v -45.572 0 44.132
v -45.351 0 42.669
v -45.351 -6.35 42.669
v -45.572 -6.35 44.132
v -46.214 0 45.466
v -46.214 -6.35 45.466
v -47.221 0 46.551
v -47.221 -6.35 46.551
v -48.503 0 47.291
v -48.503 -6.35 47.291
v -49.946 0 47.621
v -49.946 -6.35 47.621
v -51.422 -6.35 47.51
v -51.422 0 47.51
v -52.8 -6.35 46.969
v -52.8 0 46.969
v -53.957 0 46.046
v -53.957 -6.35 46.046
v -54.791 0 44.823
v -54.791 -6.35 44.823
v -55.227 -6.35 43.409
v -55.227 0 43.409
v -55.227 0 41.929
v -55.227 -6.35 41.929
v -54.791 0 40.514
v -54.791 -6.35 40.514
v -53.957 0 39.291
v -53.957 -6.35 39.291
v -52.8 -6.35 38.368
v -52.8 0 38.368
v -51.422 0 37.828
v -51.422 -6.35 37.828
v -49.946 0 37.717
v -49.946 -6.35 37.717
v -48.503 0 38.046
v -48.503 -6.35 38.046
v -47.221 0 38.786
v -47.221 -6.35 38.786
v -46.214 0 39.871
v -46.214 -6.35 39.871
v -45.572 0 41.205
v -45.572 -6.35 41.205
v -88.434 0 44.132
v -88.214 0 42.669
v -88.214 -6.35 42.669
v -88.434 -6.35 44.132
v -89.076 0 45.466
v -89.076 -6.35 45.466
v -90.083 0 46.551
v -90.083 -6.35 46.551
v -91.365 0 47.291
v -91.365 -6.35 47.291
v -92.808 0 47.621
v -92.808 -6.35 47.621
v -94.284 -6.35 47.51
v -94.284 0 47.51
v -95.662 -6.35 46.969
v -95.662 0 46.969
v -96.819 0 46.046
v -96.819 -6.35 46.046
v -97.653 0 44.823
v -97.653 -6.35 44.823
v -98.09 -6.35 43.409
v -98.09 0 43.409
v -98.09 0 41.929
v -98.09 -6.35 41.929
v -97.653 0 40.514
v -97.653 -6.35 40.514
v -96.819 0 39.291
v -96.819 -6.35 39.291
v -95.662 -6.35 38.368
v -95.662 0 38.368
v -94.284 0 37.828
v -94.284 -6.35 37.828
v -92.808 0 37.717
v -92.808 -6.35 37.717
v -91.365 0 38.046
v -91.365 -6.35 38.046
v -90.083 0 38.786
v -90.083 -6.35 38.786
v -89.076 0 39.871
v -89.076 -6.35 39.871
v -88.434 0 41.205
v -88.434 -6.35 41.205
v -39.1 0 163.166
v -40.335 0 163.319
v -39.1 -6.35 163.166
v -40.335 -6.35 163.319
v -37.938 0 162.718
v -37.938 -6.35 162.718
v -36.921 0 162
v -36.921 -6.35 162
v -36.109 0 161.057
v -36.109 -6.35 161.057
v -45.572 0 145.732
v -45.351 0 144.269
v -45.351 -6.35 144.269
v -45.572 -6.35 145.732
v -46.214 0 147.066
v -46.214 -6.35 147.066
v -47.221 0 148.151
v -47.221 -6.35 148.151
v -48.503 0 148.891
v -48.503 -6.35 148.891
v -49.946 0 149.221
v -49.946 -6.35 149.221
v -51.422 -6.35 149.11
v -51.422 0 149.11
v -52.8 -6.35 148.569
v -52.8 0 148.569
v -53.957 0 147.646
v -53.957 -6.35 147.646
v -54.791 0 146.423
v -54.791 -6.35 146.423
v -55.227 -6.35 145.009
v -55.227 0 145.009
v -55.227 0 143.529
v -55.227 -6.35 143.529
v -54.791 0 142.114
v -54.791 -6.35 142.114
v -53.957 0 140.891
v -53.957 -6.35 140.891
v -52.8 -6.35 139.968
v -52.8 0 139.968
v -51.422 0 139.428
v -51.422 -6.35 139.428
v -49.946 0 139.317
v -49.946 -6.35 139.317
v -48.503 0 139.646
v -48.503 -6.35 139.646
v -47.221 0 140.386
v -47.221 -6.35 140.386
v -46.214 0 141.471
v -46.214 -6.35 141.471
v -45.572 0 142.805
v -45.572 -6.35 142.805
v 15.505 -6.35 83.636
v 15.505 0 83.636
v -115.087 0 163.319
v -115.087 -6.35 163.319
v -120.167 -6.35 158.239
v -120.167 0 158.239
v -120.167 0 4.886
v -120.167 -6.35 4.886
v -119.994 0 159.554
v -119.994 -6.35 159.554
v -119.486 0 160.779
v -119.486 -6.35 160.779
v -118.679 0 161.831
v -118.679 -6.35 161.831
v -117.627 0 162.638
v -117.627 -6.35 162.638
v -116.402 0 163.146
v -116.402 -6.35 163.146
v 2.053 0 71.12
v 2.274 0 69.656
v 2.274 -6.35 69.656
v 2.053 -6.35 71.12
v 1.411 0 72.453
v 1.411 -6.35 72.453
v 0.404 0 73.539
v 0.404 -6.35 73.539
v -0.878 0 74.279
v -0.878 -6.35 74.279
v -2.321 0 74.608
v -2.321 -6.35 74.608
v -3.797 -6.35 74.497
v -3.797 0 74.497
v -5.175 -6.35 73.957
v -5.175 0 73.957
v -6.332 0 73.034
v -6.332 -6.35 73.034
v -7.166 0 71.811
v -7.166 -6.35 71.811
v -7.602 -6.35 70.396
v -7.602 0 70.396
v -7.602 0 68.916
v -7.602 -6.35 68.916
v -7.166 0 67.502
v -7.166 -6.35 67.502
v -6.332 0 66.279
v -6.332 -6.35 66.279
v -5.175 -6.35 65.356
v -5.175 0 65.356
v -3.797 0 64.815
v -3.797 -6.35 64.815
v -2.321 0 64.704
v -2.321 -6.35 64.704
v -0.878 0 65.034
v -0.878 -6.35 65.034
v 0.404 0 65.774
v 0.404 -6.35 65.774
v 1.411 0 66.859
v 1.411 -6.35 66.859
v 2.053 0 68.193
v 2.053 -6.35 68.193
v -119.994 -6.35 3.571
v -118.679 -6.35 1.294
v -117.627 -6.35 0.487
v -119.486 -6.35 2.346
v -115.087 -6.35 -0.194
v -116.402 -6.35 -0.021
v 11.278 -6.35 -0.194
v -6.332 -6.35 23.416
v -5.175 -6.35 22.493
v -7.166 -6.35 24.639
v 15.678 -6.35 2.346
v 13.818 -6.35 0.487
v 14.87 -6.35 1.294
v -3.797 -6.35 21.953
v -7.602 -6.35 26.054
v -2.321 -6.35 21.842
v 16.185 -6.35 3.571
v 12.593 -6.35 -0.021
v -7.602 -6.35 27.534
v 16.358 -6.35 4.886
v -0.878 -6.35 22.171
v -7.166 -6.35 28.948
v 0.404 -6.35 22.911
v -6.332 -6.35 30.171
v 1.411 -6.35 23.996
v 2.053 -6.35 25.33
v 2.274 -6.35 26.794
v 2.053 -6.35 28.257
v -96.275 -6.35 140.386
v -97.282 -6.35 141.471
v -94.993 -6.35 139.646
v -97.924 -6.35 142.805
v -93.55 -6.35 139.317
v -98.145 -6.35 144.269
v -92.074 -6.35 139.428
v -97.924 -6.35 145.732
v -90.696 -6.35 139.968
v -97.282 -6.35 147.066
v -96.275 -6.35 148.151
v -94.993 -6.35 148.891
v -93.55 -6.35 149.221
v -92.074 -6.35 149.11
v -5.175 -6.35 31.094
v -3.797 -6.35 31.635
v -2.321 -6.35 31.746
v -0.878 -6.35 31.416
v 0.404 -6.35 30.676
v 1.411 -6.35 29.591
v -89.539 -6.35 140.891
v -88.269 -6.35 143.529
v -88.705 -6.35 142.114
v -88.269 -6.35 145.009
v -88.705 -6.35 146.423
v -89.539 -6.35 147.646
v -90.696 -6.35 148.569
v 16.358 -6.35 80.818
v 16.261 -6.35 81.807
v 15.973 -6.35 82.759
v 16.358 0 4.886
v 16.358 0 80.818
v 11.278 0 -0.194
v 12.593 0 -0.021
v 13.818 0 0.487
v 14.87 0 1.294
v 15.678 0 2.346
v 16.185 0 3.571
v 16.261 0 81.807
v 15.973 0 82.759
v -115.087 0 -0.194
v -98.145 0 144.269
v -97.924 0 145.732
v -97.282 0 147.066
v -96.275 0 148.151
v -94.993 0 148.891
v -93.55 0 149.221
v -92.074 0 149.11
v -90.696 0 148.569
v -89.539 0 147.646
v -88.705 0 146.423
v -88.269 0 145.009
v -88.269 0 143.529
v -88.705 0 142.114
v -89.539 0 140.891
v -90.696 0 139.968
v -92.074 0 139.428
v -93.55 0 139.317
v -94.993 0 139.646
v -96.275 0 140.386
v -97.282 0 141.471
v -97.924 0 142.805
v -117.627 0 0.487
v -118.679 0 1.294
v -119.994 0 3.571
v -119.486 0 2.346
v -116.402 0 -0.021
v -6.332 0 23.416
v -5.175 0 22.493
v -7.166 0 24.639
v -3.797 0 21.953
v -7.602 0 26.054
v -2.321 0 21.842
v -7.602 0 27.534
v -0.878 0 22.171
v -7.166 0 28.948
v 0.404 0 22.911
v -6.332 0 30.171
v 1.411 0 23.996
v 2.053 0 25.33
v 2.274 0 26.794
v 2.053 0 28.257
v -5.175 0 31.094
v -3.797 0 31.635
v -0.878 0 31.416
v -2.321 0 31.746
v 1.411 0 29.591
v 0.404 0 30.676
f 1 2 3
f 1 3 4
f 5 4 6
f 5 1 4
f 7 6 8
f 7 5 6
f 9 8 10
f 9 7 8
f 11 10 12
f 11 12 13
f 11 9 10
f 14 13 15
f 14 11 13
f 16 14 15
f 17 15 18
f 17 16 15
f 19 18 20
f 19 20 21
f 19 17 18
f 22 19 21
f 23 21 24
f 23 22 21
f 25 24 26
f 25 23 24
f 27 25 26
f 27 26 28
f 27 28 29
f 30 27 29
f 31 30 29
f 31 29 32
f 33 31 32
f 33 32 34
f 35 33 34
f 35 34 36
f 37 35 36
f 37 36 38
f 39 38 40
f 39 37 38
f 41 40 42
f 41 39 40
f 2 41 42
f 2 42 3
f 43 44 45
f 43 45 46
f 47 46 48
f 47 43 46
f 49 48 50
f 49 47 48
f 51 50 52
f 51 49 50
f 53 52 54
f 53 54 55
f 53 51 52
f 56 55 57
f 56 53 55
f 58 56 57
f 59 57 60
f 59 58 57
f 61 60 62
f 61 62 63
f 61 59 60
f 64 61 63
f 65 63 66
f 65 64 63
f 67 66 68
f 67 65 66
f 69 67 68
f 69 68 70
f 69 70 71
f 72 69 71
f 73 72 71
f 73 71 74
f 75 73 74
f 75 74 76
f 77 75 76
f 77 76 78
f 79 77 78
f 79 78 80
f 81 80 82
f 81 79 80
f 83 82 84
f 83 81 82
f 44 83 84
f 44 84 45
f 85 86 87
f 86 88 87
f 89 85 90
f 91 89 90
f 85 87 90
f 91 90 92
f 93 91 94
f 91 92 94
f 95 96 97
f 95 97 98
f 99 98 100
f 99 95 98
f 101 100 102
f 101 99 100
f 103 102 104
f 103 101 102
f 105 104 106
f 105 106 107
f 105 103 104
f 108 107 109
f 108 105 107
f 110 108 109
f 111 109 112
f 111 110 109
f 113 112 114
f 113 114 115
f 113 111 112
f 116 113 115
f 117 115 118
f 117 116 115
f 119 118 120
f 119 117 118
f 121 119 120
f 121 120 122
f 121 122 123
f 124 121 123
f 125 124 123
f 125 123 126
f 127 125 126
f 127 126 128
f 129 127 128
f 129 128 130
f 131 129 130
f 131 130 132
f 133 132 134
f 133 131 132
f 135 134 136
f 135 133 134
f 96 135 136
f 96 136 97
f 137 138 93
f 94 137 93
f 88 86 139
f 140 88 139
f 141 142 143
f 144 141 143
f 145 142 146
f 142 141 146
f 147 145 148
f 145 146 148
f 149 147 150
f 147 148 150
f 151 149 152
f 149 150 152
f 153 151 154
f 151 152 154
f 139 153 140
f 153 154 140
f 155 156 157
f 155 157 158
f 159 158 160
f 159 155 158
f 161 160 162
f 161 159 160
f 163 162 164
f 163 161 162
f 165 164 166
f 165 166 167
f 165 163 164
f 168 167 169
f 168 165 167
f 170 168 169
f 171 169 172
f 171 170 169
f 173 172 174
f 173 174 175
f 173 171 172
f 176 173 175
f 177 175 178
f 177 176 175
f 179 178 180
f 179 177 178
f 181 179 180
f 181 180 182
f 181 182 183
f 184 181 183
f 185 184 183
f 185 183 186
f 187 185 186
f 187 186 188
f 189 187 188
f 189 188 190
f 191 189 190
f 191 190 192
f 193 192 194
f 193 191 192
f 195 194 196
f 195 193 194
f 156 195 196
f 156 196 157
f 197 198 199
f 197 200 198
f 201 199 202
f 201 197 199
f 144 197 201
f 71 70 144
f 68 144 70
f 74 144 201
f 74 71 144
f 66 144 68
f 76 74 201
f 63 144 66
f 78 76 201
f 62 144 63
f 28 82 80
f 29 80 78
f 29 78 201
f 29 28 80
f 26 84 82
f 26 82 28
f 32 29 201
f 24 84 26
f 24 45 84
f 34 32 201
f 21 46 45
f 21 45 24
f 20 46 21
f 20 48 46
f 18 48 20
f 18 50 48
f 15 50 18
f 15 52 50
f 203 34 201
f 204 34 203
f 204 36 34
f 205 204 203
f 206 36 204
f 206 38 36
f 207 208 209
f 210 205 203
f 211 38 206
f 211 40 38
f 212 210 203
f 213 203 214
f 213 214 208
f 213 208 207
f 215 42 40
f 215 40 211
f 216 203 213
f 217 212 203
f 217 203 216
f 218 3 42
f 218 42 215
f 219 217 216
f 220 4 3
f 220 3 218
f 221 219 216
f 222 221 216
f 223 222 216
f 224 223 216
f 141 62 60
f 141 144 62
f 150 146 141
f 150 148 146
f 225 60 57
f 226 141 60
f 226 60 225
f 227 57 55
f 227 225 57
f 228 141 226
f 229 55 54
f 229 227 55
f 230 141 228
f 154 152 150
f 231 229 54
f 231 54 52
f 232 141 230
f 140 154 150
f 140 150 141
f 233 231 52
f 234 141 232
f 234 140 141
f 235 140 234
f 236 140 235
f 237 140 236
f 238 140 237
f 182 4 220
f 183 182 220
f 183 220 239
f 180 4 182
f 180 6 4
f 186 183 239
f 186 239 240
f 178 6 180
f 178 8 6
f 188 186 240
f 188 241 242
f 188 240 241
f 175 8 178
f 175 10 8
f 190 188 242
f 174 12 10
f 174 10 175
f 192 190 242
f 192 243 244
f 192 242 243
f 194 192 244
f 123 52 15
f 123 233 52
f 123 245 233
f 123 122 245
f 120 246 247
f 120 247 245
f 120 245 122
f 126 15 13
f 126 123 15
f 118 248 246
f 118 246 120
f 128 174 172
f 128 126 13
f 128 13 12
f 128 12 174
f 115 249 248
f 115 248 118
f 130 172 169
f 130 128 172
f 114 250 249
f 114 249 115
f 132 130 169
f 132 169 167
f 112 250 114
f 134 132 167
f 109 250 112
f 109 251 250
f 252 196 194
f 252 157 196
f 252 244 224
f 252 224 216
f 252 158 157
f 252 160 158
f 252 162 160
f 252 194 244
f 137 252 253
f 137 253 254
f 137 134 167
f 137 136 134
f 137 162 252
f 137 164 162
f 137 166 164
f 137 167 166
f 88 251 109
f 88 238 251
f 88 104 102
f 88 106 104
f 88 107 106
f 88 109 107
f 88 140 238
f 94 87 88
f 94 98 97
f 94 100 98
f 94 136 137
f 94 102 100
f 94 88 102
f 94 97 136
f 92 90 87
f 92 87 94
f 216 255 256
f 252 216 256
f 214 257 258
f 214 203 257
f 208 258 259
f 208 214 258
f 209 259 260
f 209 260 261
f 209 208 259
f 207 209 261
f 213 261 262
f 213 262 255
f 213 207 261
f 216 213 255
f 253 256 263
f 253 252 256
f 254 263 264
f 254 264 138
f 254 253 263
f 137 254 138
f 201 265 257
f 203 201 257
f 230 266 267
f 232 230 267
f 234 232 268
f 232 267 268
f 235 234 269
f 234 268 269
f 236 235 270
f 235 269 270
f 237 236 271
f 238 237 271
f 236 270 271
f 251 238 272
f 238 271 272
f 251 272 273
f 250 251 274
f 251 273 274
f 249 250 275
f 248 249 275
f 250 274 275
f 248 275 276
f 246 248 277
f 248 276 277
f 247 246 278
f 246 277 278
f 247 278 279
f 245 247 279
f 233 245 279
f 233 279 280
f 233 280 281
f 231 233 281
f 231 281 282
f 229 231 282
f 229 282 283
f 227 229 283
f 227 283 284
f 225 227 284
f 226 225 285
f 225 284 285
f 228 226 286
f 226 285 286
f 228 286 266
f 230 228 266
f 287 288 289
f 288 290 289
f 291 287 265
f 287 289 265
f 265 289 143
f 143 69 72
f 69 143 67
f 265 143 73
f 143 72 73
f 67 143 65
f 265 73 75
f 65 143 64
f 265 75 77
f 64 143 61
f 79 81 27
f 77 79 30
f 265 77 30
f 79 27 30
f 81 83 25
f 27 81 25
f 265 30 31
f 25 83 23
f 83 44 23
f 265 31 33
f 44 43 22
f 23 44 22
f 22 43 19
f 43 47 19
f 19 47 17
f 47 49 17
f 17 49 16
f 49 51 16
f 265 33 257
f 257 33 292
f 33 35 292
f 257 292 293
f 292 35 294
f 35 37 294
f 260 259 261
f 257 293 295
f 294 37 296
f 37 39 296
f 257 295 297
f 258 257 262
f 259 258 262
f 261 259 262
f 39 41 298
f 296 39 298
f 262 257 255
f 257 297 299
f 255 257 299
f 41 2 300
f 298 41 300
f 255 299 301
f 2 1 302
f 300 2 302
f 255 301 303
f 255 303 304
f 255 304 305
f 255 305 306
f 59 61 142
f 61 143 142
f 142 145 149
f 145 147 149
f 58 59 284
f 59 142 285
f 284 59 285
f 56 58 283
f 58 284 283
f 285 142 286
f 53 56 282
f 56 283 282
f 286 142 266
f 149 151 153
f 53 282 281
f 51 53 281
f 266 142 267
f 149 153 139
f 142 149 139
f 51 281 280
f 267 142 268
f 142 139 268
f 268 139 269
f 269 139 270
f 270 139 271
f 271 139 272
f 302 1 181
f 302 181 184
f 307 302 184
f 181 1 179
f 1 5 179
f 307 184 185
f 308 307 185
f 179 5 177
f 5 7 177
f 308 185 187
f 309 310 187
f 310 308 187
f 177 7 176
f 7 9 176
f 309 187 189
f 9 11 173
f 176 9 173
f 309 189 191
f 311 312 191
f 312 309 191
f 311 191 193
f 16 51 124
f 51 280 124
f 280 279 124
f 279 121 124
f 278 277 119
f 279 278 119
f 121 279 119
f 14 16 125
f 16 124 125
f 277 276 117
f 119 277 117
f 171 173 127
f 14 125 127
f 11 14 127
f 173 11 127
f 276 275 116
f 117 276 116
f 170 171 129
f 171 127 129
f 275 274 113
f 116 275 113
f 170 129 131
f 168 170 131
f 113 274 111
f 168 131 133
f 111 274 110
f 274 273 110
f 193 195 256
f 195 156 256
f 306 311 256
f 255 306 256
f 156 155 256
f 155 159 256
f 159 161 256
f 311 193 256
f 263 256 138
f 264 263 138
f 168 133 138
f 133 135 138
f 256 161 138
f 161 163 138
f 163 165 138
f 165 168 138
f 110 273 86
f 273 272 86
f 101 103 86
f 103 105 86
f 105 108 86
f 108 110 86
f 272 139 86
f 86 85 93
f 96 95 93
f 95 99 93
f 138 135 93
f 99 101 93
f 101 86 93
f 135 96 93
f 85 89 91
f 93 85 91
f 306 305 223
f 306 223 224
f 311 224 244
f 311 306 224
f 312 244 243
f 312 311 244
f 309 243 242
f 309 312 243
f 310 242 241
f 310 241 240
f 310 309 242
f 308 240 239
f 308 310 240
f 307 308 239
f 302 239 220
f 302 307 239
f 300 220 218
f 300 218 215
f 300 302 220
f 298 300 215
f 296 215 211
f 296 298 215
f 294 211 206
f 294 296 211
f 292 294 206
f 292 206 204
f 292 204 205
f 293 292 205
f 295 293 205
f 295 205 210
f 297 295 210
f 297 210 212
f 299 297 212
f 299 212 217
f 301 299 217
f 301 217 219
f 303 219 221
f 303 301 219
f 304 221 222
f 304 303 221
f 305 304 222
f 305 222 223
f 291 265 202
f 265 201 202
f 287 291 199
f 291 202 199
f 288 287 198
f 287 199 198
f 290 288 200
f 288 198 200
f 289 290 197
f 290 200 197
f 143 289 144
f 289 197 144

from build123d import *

# Parameters (mm, degrees)
F0_R     = 4.9657
F1_DEPTH = 6.35
F2_R     = 5.08


# Not quite as in the source:
# - a feature names something its author has since deleted; it is built from what else it names


with BuildPart() as f1:
    # F0 (on Front) → F1 (new body)
    with BuildSketch(Plane.XZ):
        Polygon((-120.1667662859, -0.1937935591), (16.3582337141, -0.1937935591), (16.3582337141, 82.3562064409), (-37.6167662859, 163.3187064409), (-120.1667662859, 163.3187064409), (-120.1667662859, 144.2687064409), align=None)
        with Locations((-93.1792662859, 42.6687064409)):
            Circle(F0_R, mode=Mode.SUBTRACT)
        with Locations((-50.3167662859, 42.6687064409)):
            Circle(F0_R, mode=Mode.SUBTRACT)
        with Locations((-2.6917662859, 26.7937064409)):
            Circle(F0_R, mode=Mode.SUBTRACT)
        with Locations((-2.6917662859, 69.6562064409)):
            Circle(F0_R, mode=Mode.SUBTRACT)
        with BuildLine():
            ThreePointArc((-88.2135662859, 144.2687064409), (-93.1792662859, 139.3030064409), (-98.1449662859, 144.2687064409))
            ThreePointArc((-98.1449662859, 144.2687064409), (-93.1792662859, 149.2344064409), (-88.2135662859, 144.2687064409))
        make_face(mode=Mode.SUBTRACT)
        with Locations((-50.3167662859, 144.2687064409)):
            Circle(F0_R, mode=Mode.SUBTRACT)
    extrude(amount=F1_DEPTH)

    # F2
    f2_edges = [f1.edges().sort_by_distance(p)[0] for p in [
        (-37.616766, -3.175, 163.318706),
        (16.358234, -3.175, 82.356206),
        (16.358234, -3.175, -0.193794),
        (-120.166766, -3.175, -0.193794),
        (-120.166766, -3.175, 163.318706),
    ]]
    fillet(f2_edges, radius=F2_R)


solid = f1.part
